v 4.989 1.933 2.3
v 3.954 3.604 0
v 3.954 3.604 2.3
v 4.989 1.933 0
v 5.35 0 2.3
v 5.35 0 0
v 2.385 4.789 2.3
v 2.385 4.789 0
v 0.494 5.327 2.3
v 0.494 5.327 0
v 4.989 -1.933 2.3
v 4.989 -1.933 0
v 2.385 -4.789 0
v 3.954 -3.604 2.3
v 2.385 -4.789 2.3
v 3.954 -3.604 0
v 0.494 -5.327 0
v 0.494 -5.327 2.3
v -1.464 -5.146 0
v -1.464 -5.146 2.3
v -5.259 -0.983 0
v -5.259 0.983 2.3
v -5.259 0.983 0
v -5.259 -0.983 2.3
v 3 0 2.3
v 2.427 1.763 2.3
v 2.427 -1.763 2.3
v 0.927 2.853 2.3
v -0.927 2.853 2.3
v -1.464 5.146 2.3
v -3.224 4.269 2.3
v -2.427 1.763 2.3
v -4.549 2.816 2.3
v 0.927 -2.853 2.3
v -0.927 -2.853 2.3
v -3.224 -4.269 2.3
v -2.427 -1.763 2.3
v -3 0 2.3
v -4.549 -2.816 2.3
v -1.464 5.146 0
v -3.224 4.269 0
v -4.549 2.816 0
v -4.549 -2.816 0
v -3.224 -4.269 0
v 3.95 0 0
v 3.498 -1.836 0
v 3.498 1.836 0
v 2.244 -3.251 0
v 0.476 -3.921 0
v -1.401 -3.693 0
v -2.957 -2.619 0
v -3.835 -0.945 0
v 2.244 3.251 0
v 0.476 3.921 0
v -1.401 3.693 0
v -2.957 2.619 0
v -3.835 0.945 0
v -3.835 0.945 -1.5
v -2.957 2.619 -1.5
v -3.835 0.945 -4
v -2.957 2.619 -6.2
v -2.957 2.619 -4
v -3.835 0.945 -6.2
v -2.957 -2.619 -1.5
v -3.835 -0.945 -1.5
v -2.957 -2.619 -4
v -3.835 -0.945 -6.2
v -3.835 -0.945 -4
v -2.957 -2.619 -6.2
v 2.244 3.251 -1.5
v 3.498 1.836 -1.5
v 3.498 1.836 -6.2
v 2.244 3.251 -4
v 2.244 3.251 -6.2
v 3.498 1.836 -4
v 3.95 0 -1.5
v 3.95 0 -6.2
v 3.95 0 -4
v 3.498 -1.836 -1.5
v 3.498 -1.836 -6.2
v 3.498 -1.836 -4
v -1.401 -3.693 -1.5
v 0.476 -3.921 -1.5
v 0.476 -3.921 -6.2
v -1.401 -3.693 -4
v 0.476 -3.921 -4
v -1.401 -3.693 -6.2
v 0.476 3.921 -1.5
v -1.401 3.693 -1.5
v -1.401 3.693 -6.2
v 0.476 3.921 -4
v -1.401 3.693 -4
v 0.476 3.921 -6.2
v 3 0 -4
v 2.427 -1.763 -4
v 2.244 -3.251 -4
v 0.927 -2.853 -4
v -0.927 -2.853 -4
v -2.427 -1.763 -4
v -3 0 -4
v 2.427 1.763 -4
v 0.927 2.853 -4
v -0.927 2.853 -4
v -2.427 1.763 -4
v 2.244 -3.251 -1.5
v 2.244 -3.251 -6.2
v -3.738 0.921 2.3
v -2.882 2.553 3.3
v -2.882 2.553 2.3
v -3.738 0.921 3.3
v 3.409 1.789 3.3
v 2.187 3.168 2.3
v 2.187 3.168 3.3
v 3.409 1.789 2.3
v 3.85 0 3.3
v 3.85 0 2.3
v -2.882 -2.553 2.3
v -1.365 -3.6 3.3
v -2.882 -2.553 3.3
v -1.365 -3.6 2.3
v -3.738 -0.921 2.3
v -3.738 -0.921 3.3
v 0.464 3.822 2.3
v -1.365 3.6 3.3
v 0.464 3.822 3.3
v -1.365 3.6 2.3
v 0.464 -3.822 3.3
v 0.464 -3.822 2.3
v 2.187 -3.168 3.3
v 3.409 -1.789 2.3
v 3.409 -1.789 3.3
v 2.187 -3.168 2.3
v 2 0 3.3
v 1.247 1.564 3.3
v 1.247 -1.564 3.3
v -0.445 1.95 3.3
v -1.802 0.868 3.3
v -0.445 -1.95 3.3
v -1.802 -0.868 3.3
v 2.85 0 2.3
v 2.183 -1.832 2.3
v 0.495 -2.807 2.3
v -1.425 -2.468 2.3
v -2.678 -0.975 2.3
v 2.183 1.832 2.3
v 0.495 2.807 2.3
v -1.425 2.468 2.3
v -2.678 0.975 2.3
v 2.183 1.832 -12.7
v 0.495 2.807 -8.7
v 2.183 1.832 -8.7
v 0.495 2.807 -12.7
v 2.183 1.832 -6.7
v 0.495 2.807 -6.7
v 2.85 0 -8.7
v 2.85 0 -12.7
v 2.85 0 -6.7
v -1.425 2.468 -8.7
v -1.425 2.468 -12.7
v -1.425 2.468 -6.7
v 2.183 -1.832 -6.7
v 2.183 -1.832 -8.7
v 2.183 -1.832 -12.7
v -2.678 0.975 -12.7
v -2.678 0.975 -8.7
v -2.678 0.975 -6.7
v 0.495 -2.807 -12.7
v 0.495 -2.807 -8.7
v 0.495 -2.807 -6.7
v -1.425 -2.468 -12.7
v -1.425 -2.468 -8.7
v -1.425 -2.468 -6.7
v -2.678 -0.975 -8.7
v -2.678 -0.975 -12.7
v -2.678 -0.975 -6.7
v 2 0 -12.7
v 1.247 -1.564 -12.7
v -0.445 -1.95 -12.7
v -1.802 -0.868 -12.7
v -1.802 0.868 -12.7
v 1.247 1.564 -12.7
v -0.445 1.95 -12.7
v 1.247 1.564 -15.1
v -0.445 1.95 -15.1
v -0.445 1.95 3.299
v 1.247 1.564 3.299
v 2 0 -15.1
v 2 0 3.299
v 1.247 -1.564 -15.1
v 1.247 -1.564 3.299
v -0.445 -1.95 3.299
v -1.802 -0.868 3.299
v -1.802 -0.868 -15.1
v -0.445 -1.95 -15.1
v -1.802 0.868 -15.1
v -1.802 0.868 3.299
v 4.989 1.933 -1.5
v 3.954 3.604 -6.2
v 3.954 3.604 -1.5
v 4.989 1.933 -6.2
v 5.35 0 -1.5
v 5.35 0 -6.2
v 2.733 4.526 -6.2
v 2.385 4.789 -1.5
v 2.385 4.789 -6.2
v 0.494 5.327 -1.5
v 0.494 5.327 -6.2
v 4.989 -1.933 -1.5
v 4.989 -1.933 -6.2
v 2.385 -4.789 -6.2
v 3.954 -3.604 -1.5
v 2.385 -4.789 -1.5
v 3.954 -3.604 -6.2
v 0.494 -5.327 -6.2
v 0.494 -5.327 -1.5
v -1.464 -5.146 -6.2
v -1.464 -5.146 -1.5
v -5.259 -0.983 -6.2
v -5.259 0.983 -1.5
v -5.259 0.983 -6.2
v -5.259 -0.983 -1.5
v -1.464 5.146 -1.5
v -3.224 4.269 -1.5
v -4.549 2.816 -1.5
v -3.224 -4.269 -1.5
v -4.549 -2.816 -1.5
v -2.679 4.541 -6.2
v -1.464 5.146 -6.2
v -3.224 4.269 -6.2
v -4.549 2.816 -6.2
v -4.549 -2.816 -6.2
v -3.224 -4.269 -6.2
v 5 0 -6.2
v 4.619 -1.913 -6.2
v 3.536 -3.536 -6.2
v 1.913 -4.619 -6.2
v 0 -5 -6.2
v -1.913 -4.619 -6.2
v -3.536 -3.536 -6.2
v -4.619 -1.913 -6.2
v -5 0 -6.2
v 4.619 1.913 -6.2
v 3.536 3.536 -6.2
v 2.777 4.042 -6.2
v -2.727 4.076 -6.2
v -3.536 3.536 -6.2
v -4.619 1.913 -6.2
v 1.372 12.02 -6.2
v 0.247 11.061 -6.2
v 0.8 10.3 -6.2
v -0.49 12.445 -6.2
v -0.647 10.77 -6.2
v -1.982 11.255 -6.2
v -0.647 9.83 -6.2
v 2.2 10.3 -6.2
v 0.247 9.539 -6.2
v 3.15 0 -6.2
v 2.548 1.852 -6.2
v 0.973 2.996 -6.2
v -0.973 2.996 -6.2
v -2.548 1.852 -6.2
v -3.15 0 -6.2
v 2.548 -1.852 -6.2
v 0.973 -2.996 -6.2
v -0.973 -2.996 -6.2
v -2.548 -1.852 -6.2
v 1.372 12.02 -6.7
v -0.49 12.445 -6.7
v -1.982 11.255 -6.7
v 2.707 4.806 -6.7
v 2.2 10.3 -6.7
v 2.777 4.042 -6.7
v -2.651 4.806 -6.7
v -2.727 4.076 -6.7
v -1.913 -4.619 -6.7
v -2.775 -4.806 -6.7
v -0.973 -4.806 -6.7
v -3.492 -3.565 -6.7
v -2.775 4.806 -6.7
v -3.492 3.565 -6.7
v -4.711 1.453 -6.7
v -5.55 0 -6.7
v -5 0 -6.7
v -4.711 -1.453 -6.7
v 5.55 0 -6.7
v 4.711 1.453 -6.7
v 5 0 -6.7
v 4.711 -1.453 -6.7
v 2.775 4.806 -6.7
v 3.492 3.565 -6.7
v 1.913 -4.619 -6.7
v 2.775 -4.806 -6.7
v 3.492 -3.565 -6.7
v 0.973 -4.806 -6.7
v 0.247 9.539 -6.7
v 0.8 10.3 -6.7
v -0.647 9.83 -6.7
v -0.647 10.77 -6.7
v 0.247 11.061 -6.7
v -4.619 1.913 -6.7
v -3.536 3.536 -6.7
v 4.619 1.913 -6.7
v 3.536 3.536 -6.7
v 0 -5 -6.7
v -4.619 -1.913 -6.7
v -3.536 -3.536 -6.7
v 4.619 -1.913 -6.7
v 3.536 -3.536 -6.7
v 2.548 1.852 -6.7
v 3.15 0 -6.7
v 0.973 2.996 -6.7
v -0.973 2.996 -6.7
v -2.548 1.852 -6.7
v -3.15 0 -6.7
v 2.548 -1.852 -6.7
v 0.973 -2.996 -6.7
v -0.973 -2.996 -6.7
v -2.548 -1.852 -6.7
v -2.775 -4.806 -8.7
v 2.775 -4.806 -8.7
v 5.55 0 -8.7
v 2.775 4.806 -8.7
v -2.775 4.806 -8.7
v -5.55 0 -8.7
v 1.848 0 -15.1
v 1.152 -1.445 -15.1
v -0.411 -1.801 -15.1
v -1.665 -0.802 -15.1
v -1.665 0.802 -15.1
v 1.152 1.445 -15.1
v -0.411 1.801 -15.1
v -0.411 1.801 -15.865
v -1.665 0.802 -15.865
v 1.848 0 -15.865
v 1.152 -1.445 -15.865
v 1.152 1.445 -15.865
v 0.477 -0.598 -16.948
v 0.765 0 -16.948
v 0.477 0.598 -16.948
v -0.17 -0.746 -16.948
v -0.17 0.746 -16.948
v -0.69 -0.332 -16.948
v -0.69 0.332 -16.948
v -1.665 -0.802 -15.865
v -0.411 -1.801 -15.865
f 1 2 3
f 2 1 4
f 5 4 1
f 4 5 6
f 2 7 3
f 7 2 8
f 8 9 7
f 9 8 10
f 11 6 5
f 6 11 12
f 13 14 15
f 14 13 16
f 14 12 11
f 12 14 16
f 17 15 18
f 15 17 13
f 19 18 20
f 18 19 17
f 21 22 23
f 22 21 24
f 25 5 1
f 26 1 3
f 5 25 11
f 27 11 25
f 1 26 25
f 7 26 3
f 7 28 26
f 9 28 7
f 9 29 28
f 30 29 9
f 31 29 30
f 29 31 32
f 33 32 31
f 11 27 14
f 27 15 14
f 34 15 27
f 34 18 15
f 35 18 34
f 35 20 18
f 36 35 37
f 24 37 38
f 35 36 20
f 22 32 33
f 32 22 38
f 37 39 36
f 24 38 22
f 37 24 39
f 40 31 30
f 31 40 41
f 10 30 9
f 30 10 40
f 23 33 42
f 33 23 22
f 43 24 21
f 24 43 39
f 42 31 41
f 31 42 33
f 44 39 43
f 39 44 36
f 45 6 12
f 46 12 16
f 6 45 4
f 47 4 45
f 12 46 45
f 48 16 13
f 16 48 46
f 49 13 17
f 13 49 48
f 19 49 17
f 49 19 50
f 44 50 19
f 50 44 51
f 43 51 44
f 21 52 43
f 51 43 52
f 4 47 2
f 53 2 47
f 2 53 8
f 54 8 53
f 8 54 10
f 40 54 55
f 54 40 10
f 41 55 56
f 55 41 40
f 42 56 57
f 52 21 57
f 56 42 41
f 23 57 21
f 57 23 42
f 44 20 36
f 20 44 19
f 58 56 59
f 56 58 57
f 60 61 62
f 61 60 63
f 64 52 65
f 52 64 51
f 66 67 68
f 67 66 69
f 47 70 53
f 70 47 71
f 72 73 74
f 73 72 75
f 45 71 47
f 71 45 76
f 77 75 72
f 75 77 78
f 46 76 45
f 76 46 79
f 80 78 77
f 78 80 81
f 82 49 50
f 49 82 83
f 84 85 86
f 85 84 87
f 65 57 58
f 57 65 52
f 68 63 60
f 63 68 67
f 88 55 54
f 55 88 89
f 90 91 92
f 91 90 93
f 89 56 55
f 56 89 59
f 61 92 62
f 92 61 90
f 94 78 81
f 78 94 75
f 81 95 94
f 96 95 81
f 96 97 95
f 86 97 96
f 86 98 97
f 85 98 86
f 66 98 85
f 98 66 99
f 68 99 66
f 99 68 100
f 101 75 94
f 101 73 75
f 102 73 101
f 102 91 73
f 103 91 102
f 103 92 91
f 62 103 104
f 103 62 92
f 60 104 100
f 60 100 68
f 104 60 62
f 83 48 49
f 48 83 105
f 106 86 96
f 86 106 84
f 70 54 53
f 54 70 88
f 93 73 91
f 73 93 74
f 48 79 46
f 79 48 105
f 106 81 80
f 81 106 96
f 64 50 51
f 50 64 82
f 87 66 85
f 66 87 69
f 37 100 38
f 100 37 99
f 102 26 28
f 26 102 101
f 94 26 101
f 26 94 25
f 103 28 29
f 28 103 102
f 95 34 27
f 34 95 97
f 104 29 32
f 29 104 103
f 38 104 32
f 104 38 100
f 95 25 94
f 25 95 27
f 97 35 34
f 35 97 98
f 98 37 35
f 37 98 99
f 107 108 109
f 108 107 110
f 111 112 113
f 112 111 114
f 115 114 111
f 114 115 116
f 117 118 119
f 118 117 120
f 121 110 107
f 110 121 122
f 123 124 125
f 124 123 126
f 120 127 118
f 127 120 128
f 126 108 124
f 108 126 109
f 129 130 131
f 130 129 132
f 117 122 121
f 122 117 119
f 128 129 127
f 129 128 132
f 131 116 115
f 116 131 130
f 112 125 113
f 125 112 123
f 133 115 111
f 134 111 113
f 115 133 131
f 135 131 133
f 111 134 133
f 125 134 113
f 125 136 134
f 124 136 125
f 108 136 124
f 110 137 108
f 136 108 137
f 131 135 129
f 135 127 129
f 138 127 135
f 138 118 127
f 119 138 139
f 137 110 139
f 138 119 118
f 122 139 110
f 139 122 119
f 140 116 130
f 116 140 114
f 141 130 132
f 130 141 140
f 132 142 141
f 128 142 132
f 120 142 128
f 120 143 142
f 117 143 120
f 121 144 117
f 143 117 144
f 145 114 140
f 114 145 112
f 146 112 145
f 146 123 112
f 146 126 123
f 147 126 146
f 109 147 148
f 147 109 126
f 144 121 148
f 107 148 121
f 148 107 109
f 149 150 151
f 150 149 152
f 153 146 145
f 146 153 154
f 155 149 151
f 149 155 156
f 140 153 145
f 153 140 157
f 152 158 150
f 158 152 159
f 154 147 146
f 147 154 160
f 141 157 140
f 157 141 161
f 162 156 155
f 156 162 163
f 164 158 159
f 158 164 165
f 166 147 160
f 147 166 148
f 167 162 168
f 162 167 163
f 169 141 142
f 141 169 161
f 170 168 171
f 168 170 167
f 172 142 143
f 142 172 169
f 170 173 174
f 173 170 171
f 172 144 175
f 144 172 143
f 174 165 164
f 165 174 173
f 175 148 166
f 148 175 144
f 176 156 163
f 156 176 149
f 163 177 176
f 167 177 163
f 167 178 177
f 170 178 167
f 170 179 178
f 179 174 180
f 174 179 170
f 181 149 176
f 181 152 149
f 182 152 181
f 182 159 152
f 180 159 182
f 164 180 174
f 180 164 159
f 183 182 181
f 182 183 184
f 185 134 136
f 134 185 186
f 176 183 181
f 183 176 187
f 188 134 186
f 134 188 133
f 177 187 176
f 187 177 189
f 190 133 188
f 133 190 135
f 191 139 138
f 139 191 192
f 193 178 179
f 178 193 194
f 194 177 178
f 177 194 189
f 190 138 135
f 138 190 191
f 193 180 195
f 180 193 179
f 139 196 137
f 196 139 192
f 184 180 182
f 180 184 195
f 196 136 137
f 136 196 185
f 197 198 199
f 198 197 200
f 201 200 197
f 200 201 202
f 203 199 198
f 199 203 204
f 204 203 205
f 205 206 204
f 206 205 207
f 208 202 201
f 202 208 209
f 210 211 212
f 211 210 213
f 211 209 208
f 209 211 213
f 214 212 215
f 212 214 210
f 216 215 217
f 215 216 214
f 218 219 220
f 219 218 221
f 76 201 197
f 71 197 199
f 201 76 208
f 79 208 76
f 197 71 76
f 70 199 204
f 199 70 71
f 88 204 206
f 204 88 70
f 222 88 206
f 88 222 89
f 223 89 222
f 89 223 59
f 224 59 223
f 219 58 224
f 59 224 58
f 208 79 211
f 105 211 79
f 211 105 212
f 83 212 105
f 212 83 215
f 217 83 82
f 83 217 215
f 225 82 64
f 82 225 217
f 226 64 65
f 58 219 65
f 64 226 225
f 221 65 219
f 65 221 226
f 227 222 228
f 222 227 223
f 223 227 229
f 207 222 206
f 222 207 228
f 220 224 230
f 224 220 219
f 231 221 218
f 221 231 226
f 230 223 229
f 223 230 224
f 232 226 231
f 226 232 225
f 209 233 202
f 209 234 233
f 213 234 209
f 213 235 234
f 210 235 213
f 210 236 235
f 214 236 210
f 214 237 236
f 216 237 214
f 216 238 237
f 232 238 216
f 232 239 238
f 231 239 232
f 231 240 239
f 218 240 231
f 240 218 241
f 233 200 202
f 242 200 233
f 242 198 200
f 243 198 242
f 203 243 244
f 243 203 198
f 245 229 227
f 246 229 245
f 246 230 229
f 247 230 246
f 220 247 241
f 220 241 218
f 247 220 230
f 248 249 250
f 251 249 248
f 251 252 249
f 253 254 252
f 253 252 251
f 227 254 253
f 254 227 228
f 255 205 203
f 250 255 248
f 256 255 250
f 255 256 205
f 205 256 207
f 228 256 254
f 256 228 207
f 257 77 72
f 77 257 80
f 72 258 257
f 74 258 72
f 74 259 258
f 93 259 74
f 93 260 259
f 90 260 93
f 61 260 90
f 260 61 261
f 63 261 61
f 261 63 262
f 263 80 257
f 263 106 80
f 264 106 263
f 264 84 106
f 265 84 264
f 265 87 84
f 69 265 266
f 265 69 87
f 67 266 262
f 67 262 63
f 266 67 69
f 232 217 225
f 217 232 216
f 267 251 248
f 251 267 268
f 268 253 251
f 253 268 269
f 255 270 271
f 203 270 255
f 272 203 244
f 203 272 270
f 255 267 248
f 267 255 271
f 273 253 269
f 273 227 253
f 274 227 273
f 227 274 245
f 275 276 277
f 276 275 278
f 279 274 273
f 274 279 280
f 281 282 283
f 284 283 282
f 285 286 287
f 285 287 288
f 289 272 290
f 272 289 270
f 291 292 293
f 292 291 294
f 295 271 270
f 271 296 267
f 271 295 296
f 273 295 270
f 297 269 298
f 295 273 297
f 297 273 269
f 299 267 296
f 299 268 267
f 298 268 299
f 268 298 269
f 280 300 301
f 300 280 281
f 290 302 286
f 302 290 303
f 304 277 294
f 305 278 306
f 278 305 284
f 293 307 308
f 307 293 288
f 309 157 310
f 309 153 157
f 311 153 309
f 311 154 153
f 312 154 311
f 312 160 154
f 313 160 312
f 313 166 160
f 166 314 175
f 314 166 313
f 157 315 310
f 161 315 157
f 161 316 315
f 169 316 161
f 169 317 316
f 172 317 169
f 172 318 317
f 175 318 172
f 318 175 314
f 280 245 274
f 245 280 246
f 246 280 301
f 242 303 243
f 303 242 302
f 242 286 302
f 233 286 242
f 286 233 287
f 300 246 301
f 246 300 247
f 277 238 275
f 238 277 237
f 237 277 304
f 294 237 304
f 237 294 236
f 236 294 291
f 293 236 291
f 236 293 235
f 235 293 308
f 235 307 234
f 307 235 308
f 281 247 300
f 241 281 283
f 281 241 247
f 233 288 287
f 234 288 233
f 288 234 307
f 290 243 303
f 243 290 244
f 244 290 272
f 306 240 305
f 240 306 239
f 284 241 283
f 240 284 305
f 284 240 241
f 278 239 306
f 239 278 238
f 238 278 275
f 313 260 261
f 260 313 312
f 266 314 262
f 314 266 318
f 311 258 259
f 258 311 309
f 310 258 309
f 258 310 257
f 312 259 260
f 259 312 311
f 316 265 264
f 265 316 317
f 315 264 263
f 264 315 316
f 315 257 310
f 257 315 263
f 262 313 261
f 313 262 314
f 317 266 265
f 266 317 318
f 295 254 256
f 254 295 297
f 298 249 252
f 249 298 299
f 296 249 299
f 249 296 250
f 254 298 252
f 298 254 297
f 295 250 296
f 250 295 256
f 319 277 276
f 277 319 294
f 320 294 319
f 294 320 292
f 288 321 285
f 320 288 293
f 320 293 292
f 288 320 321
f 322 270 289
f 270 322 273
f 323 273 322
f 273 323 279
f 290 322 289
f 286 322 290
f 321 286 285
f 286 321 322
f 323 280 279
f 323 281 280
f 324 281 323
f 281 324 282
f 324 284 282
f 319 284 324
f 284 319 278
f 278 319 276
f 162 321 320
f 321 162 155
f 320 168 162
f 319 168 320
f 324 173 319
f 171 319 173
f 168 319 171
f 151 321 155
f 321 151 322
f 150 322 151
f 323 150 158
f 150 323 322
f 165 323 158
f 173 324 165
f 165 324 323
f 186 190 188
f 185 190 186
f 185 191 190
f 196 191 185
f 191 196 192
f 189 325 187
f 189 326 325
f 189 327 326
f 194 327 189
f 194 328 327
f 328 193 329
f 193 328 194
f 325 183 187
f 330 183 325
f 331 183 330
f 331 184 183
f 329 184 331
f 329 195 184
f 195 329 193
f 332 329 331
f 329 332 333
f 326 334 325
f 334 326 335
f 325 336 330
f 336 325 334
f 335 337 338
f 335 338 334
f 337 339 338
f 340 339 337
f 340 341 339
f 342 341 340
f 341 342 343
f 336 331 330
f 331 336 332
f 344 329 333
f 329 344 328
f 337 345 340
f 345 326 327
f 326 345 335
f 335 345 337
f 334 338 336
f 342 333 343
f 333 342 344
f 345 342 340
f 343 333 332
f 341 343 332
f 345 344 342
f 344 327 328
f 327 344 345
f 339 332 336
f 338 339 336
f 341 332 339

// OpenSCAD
// file: Pipe.scad
e = 0.01;

module Pipe(h, r_out, r_in, $fn = $fn) {
  difference() {
    cylinder(h, r = r_out, $fn = $fn);
    translate([0, 0, -e])
      cylinder(h + e * 2, r = r_in, $fn = $fn);
  }
}
// main file
use <Pipe.scad>;

Plastic_Stick_Out_Length = 2.3;
Plastic_Stick_Out_Diameter = 10.7;

Plastic_Length = 4;
Plastic_Diameter = 7.9;

Plastic_Hole_Diameter = 6;

Plastic_Ring_Length = 4.7;

Metal_Stick_Out_Length = 1;
Metal_Stick_Out_Diameter = 7.7;
Metal_Hole_Diameter = 4;
Metal_Length = 15;
Metal_Diameter = 5.7;

Fin_Thickness = 0.5;
Fin_Length = 17.5;
Fin_Diameter_1 = 10;
Fin_Diameter_1_Inner = 6.3;
Fin_Hole_1_Diameter = 6.3;

Fin_Diameter_2 = 4.4;
Fin_Hole_2_Offset = Fin_Length - (Fin_Diameter_1 + Fin_Diameter_2) / 2;
Fin_Hole_2_Diameter = 1.6;

Nut_Thickness = 2;
Nut_Size = 11.1;
Nut_Hole_Diameter = 5.2;

Plug_Length = 20.4;
Plug_Diameter = 4;

e = 0.001;

BananaJack("#F00", "#888", 1.5, false);

module BananaJack(color, metal_color, case_thickness, negative = false) {
    if (negative) {
        color(color)
            translate([0, 0, Plastic_Stick_Out_Length + Metal_Stick_Out_Length - Plug_Length])
                cylinder(Plug_Length, d = Plastic_Diameter);
    } else {
        color(color) {
            difference() {
                union() {
                    cylinder(Plastic_Stick_Out_Length, d = Plastic_Stick_Out_Diameter);
                    translate([0, 0, -Plastic_Length]) {
                        cylinder(Plastic_Length, d = Plastic_Diameter);
                    }
                }
                translate([0, 0, -Plastic_Length - e / 2]) {
                    translate([0, 0, -Plastic_Stick_Out_Length])
                    cylinder(Plastic_Stick_Out_Length + Plastic_Stick_Out_Diameter + e, d = Plastic_Hole_Diameter);
                }
            }
        }

        color(metal_color) {
            translate([0, 0, Plastic_Stick_Out_Length])
                difference() {
                    union() {
                        cylinder(Metal_Stick_Out_Length, d = Metal_Stick_Out_Diameter);
                        translate([0, 0, -Metal_Length]) {
                            cylinder(Metal_Length, d = Metal_Diameter);
                        }
                    }
                    translate([0, 0, -Metal_Length - e / 2]) {
                        cylinder(Metal_Length  + Metal_Stick_Out_Length + e, d = Metal_Hole_Diameter);
                    }
                }
        }
        translate([0, 0, -case_thickness]) {
            translate([0, 0, -Plastic_Ring_Length]) {
                color(color)
                    Pipe(Plastic_Ring_Length, Plastic_Stick_Out_Diameter / 2, Plastic_Diameter / 2);
                color(metal_color) {
                    translate([0, 0, -Fin_Thickness]) {
                        difference() {
                            union() {
                                hull() {
                                    cylinder(Fin_Thickness, d = Fin_Diameter_1_Inner);
                                    translate([0, Fin_Hole_2_Offset, 0])
                                        cylinder(Fin_Thickness, d = Fin_Diameter_2);
                                }
                                cylinder(Fin_Thickness, d = Fin_Diameter_1);
                            }
                            translate([0, 0, -e / 2]) {
                                cylinder(Fin_Thickness + e, d = Fin_Hole_1_Diameter);
                                translate([0, Fin_Hole_2_Offset, 0])
                                    cylinder(Fin_Thickness + e, d = Fin_Hole_2_Diameter);
                            }
                        }
                        translate([0, 0, -Nut_Thickness]) {
                            difference() {
                                cylinder(Nut_Thickness, d = Nut_Size, $fn = 6);
                                translate([0, 0, -e / 2]) {
                                    cylinder(Nut_Thickness + e, d = Nut_Hole_Diameter);
                                }
                            }
                        }
                    }
                }
            }
        }

        color(metal_color, 0.4) {
            translate([0, 0, Plastic_Stick_Out_Length + Metal_Stick_Out_Length - Plug_Length + Plug_Diameter / 2]) {
                translate([0, 0, 0])
                    cylinder(Plug_Length - Plug_Diameter / 2 - e, d = Plug_Diameter);
                sphere(d = Plug_Diameter);
            }
        }
    }
}
